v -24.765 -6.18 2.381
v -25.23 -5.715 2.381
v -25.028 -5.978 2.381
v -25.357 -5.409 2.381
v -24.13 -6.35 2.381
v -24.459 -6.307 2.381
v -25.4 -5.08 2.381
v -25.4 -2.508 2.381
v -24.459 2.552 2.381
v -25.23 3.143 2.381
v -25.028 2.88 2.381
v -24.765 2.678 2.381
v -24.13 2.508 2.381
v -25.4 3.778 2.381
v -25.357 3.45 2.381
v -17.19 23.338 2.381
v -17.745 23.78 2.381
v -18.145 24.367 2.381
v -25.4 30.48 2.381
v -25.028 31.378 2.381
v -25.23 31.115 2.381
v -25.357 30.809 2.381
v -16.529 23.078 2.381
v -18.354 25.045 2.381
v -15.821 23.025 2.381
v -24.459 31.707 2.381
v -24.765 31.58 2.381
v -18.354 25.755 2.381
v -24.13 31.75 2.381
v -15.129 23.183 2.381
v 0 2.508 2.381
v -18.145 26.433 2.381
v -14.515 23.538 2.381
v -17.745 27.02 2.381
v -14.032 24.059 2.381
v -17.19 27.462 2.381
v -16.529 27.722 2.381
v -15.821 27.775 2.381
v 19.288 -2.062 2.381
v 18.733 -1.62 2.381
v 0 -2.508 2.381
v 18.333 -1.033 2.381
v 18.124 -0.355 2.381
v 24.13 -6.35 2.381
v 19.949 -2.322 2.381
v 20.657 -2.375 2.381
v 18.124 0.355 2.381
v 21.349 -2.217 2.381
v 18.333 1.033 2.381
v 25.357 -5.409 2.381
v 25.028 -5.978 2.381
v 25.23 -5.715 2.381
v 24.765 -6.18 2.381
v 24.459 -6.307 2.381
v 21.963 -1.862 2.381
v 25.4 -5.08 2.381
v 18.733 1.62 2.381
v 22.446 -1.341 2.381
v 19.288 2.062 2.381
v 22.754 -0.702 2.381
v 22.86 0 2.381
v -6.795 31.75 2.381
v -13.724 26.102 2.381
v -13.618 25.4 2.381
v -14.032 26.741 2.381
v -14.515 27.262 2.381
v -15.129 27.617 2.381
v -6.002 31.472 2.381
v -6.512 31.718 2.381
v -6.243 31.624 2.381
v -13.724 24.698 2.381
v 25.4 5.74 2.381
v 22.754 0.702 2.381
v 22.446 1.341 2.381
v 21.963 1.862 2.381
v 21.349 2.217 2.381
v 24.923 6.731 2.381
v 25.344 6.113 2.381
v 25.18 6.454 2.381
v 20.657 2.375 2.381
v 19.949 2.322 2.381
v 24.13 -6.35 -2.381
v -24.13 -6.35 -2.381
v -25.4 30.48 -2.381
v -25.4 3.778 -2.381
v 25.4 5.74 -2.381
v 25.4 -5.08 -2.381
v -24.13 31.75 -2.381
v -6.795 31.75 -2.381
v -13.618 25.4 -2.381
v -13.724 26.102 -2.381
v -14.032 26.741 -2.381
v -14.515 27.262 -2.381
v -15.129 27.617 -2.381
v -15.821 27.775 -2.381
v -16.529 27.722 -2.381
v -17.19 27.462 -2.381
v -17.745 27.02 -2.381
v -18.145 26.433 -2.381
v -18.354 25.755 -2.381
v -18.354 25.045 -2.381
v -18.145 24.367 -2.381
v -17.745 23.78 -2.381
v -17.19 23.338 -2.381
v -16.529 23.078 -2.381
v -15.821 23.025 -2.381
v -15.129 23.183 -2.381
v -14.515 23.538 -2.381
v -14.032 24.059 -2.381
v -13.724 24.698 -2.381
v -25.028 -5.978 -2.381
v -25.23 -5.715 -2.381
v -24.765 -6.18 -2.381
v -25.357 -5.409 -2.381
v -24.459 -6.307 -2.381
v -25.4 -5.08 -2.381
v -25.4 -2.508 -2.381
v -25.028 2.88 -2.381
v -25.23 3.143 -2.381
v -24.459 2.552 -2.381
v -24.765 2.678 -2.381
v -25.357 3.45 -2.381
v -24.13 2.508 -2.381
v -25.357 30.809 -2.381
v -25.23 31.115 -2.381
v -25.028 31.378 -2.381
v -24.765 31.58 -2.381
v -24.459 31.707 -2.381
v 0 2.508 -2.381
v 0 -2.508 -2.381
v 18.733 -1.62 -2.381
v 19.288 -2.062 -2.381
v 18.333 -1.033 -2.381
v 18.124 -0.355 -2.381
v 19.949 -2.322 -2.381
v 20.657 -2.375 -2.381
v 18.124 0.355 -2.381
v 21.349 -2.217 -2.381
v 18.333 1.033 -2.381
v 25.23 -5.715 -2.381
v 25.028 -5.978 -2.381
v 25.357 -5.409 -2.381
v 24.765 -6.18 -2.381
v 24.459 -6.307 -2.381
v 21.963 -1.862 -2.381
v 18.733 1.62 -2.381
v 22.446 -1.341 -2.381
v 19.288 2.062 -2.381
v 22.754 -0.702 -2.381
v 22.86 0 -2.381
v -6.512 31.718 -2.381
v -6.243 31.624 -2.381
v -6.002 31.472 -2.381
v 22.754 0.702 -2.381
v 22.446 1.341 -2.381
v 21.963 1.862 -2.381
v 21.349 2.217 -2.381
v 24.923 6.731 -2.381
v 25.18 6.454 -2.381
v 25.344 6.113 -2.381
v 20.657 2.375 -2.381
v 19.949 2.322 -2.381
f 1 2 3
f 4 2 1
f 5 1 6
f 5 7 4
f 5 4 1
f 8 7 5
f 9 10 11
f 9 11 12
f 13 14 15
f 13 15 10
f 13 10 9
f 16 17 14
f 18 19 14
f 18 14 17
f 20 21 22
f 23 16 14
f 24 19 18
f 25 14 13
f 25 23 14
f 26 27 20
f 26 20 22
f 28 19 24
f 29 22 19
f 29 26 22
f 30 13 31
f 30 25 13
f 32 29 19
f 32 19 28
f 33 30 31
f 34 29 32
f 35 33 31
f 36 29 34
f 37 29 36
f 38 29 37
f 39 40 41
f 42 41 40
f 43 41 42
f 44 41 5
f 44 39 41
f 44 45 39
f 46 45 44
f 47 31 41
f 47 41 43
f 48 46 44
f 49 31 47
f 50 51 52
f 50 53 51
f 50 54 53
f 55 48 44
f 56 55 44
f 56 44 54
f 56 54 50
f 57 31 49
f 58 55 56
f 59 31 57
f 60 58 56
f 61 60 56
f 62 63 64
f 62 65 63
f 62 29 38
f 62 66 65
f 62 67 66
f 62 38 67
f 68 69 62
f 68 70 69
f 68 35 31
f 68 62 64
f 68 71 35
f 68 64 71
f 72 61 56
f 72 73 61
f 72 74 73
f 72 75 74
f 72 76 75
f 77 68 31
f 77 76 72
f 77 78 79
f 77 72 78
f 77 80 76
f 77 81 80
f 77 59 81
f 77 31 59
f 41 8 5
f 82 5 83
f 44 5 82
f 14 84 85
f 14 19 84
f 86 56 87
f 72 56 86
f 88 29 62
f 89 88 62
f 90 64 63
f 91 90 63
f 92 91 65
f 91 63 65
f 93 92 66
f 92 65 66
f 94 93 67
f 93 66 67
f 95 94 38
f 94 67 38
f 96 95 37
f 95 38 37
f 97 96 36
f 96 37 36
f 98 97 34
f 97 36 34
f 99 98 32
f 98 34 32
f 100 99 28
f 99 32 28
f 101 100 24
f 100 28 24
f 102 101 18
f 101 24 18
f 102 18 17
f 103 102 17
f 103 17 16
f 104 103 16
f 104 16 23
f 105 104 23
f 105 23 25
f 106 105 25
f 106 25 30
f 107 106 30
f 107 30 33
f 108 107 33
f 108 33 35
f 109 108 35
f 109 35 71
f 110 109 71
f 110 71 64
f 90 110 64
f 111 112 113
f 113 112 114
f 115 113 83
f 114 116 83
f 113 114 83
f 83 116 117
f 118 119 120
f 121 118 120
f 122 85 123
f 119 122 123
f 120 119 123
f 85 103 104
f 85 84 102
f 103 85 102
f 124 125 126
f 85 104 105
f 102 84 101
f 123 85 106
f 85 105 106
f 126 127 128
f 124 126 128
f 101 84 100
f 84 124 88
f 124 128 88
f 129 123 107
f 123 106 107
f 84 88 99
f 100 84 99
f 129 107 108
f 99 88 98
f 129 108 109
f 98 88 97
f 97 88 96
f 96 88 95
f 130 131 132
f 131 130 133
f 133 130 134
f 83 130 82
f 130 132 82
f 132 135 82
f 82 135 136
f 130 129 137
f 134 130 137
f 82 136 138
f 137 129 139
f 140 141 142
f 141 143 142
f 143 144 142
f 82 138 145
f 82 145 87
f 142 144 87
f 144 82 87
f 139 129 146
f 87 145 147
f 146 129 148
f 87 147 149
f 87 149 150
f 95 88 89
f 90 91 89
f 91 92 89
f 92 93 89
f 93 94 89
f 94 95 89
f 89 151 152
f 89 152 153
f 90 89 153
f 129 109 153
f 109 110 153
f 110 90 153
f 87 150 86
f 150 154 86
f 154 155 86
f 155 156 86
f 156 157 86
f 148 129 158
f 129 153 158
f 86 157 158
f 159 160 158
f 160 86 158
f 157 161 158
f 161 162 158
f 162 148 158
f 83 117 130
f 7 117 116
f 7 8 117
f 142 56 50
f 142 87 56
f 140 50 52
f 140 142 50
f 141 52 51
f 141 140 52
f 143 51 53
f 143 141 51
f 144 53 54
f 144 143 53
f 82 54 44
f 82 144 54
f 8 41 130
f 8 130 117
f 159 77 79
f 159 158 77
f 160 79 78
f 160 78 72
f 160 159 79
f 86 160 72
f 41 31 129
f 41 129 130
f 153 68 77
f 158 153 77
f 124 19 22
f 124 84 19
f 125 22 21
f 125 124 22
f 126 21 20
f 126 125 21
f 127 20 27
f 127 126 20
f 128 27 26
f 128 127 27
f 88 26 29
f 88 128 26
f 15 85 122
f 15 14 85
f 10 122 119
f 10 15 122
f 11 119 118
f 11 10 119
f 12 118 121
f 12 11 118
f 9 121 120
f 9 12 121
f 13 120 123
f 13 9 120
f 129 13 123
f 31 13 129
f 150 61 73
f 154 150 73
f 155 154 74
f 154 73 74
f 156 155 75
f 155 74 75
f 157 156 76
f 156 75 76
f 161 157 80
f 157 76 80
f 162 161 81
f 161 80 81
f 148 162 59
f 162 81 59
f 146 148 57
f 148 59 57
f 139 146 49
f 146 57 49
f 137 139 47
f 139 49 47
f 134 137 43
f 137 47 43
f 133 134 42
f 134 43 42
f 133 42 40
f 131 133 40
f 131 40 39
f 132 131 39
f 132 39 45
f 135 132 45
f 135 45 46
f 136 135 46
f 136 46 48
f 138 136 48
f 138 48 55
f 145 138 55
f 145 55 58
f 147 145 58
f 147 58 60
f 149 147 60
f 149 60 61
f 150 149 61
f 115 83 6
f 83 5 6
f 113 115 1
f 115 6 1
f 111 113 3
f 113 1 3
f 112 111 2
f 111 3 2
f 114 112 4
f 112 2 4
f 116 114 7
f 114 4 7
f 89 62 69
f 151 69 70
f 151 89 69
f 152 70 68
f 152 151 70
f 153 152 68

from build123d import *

# Parameters (mm, degrees)
SKETCH1_W           = 50.8
SKETCH1_H           = 25.4
BOSS_EXTRUDE1_DEPTH = 2.38125
SKETCH2_R           = 2.38125
CUT_EXTRUDE1_DEPTH  = 41.937805342
SKETCH3_R           = 2.38125
CUT_EXTRUDE2_DEPTH  = 41.937805342
CUT_EXTRUDE3_DEPTH  = 41.937805342
FILLET1_R           = 1.27


with BuildPart() as part:
    # Sketch1 → Boss-Extrude1 (new, symmetric)
    with BuildSketch(Plane.XY):
        with Locations((0, 19.05)):
            Rectangle(SKETCH1_W, SKETCH1_H)
        Polygon((25.4, 0), (0, 0), (0, -2.50825), (-25.4, -2.50825), (-25.4, -6.35), (25.4, -6.35), align=None)
        Polygon((-25.4, 6.35), (-25.4, 2.50825), (0, 2.50825), (0, 0), (25.4, 0), (25.4, 6.35), align=None)
    extrude(amount=BOSS_EXTRUDE1_DEPTH, both=True)

    # Sketch2 → Cut-Extrude1 (cut, through all)
    with BuildSketch(Plane.XY.offset(2.38125)):
        with Locations((20.47875, 0)):
            Circle(SKETCH2_R)
    extrude(amount=-CUT_EXTRUDE1_DEPTH, mode=Mode.SUBTRACT)

    # Sketch3 → Cut-Extrude2 (cut, through all)
    with BuildSketch(Plane.XY.offset(2.38125)):
        with Locations((-15.999222806, 25.4)):
            Circle(SKETCH3_R)
    extrude(amount=-CUT_EXTRUDE2_DEPTH, mode=Mode.SUBTRACT)

    # Sketch4 → Cut-Extrude3 (cut, through all)
    with BuildSketch(Plane.XY.offset(2.38125)):
        Polygon((-6.35, 31.75), (25.4, 6.35), (25.4, 31.75), align=None)
    extrude(amount=-CUT_EXTRUDE3_DEPTH, mode=Mode.SUBTRACT)

    # Fillet1
    fillet1_edges = [part.edges().sort_by_distance(p)[0] for p in [
        (-25.4, 31.75, 0),
        (25.4, -6.35, 0),
        (-25.4, -6.35, 0),
        (-25.4, 2.50825, 0),
        (-6.35, 31.75, 0),
        (25.4, 6.35, 0),
    ]]
    fillet(fillet1_edges, radius=FILLET1_R)


solid = part.part
